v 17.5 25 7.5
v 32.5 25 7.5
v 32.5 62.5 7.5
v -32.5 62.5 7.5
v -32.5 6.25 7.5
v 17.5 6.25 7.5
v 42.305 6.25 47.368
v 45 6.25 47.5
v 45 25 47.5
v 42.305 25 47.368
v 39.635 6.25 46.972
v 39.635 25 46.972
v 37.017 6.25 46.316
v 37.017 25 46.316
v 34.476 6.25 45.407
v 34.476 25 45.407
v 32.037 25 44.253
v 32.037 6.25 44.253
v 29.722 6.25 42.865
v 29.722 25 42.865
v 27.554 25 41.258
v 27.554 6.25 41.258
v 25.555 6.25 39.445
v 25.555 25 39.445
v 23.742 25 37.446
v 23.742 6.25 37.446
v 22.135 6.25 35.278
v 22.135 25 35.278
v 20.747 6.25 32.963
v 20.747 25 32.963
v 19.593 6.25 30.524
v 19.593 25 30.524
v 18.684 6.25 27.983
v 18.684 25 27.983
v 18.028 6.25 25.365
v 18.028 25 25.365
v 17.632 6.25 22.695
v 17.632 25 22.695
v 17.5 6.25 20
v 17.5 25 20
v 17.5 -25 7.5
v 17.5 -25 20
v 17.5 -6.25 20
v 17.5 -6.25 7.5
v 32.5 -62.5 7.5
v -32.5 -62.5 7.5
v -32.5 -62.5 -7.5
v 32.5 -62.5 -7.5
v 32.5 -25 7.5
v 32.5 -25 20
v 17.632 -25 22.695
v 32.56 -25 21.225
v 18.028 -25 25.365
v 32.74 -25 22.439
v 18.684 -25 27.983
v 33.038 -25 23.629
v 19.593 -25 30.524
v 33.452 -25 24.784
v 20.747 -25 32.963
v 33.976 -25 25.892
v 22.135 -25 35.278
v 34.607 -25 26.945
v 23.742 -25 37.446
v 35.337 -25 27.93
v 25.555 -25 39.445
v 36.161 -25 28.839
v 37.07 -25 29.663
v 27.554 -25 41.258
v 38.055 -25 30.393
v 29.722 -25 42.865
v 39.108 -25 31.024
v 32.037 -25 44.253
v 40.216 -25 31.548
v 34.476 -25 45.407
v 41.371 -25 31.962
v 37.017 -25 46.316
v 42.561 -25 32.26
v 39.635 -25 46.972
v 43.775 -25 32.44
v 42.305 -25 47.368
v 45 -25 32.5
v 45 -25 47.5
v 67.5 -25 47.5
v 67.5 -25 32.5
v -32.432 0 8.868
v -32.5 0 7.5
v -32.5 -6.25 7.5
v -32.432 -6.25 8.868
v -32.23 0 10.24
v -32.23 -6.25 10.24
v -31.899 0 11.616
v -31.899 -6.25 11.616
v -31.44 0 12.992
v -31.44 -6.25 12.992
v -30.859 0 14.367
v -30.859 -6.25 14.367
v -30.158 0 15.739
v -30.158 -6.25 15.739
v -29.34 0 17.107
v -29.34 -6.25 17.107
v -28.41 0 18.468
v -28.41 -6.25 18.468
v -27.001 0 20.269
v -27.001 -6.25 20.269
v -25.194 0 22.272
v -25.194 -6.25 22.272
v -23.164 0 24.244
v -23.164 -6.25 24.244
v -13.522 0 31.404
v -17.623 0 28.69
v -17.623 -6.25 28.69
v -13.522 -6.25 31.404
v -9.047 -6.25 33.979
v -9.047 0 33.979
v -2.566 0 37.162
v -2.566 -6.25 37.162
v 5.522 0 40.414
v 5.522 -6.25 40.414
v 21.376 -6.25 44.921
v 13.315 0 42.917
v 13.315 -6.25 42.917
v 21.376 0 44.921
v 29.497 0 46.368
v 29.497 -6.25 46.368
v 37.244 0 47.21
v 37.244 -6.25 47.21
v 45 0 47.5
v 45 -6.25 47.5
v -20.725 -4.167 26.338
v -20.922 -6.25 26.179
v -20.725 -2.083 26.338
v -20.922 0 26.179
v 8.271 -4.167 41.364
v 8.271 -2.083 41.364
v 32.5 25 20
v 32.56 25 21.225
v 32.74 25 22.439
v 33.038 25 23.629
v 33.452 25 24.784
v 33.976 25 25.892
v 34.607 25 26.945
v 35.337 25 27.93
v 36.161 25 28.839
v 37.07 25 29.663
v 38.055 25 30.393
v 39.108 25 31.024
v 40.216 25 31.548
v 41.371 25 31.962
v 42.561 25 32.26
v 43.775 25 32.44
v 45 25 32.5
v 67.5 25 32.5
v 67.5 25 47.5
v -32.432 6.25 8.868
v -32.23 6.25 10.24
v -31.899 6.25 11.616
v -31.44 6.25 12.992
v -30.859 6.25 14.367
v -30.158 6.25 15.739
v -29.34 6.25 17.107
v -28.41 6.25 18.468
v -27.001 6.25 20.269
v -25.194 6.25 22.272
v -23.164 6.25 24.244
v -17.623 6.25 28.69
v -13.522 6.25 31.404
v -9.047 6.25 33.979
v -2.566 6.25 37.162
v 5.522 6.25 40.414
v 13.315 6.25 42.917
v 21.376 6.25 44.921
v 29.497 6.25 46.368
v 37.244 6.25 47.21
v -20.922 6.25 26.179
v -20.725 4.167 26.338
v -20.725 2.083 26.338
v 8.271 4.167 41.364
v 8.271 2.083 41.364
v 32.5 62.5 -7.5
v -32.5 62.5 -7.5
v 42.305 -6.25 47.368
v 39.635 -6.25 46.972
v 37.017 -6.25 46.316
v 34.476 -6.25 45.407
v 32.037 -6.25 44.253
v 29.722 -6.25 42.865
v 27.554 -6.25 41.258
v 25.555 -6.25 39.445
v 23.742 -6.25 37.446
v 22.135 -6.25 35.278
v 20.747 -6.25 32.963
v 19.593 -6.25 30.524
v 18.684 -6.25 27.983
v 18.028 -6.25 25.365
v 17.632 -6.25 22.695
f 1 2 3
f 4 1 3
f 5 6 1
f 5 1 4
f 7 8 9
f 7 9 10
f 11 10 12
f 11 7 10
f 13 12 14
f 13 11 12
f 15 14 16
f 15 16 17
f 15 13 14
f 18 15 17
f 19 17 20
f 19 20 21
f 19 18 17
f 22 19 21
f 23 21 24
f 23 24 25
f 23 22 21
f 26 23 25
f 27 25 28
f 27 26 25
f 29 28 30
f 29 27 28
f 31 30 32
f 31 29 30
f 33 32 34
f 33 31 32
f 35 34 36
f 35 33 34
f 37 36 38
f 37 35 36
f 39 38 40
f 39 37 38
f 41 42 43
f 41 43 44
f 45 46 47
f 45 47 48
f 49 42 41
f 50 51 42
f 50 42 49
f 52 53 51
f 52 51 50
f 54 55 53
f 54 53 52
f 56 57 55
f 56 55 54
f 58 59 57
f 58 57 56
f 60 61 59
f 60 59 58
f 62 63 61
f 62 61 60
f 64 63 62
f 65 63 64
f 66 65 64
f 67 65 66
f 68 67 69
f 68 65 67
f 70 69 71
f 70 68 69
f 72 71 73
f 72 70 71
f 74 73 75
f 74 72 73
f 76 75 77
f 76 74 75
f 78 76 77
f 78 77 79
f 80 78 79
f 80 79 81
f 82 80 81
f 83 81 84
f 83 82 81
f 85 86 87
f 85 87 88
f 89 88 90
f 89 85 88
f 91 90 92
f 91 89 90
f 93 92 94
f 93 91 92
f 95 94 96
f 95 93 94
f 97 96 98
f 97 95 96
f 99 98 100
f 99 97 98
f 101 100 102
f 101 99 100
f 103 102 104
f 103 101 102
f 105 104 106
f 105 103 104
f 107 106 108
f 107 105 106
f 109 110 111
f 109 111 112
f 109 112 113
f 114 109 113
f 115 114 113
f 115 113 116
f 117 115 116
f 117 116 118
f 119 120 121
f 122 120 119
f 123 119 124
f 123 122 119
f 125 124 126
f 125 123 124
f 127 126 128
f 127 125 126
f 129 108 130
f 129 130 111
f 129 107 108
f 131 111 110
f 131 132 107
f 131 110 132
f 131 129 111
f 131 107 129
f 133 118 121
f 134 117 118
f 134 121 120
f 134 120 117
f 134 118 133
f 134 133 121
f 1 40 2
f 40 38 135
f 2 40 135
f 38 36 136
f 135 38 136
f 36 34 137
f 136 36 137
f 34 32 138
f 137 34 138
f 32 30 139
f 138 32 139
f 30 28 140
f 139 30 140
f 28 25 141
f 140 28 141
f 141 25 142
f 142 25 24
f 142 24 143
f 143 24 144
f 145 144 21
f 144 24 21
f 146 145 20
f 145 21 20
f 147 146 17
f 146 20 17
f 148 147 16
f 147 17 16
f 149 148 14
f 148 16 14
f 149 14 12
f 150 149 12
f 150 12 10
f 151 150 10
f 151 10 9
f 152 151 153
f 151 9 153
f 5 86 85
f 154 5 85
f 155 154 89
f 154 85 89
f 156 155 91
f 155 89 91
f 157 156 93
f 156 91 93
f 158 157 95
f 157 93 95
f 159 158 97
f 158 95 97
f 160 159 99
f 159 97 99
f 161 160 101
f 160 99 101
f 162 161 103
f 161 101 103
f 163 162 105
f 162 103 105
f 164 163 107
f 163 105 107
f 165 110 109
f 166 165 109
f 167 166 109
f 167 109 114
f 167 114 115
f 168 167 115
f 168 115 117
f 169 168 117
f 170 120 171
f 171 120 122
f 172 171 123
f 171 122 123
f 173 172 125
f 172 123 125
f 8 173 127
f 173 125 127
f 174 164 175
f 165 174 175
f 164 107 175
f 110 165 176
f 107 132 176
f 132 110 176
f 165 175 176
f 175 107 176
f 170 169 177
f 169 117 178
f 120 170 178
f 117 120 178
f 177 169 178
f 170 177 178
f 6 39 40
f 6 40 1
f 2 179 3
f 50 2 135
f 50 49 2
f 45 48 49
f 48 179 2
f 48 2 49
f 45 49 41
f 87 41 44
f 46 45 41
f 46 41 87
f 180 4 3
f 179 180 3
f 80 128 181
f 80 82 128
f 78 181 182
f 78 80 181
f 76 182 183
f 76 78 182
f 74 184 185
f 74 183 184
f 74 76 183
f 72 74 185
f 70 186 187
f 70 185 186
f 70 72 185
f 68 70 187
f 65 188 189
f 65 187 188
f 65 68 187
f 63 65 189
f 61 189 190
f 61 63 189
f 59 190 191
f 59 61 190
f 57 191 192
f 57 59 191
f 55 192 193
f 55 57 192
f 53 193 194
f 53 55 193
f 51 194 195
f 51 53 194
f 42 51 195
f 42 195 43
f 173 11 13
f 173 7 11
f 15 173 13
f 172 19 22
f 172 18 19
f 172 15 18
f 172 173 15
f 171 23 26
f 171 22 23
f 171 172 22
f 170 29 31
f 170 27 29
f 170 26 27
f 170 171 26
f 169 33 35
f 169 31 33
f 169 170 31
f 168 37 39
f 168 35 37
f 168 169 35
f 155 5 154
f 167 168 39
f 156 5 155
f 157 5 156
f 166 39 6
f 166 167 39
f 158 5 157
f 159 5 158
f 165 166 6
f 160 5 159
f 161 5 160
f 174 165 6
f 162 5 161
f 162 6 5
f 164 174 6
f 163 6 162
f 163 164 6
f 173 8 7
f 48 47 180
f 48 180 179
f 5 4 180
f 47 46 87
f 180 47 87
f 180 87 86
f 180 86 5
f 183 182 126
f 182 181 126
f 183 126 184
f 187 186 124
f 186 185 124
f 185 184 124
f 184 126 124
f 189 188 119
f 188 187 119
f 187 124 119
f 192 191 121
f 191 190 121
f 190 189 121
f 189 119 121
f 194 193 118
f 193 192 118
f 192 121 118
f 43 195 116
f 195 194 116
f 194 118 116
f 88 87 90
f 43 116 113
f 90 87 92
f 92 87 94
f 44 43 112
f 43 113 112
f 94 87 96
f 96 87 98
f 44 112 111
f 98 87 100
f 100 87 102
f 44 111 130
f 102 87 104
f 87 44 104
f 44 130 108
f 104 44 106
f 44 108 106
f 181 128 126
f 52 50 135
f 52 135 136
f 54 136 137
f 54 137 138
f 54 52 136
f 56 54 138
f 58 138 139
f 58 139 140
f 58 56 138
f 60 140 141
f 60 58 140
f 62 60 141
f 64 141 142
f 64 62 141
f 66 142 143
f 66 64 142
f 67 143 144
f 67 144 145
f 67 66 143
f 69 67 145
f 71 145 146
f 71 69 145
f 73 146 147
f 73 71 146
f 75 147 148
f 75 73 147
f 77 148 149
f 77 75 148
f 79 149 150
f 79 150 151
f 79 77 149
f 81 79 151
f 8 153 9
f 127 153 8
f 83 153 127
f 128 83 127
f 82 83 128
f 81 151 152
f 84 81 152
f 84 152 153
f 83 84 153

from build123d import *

# Parameters (mm, degrees)
F1_DEPTH = 62.5
F0_W     = 20
F0_H     = 15
F2_DEPTH = 25
F3_DEPTH = 6.25


with BuildPart() as f1:
    # F0 (on Front) → F1 (new body, symmetric)
    with BuildSketch(Plane.XZ):
        Polygon((17.5, 7.5), (-32.5, 7.5), (-32.5, -7.5), (32.5, -7.5), (32.5, 7.5), align=None)
    extrude(amount=F1_DEPTH, both=True)

    # F0 (on Front) → F2 (join, symmetric)
    with BuildSketch(Plane.XZ):
        with BuildLine():
            Line((17.5, 20), (17.5, 7.5))
            Line((17.5, 7.5), (32.5, 7.5))
            Line((32.5, 7.5), (32.5, 20))
            ThreePointArc((32.5, 20), (36.1611652352, 28.8388347648), (45, 32.5))
            Line((45, 32.5), (47.5, 32.5))
            Line((47.5, 32.5), (47.5, 47.5))
            Line((47.5, 47.5), (45, 47.5))
            ThreePointArc((45, 47.5), (25.5545635174, 39.4454364826), (17.5, 20))
        make_face()
        with Locations((57.5, 40)):
            Rectangle(F0_W, F0_H)
    extrude(amount=F2_DEPTH, both=True)

    # F0 (on Front) → F3 (join, symmetric)
    with BuildSketch(Plane.XZ):
        with BuildLine():
            add(Edge.make_bspline(
                [(-32.5, 7.5), (-32.5, 26.5529304743), (7.5689763762, 47.5), (45, 47.5)],
                knots=[0, 0, 0, 0, 87.2138177126, 87.2138177126, 87.2138177126, 87.2138177126], degree=3))
            Line((-32.5, 7.5), (17.5, 7.5))
            Line((17.5, 7.5), (17.5, 20))
            ThreePointArc((17.5, 20), (25.5545635174, 39.4454364826), (45, 47.5))
        make_face()
    extrude(amount=F3_DEPTH, both=True)


solid = f1.part
